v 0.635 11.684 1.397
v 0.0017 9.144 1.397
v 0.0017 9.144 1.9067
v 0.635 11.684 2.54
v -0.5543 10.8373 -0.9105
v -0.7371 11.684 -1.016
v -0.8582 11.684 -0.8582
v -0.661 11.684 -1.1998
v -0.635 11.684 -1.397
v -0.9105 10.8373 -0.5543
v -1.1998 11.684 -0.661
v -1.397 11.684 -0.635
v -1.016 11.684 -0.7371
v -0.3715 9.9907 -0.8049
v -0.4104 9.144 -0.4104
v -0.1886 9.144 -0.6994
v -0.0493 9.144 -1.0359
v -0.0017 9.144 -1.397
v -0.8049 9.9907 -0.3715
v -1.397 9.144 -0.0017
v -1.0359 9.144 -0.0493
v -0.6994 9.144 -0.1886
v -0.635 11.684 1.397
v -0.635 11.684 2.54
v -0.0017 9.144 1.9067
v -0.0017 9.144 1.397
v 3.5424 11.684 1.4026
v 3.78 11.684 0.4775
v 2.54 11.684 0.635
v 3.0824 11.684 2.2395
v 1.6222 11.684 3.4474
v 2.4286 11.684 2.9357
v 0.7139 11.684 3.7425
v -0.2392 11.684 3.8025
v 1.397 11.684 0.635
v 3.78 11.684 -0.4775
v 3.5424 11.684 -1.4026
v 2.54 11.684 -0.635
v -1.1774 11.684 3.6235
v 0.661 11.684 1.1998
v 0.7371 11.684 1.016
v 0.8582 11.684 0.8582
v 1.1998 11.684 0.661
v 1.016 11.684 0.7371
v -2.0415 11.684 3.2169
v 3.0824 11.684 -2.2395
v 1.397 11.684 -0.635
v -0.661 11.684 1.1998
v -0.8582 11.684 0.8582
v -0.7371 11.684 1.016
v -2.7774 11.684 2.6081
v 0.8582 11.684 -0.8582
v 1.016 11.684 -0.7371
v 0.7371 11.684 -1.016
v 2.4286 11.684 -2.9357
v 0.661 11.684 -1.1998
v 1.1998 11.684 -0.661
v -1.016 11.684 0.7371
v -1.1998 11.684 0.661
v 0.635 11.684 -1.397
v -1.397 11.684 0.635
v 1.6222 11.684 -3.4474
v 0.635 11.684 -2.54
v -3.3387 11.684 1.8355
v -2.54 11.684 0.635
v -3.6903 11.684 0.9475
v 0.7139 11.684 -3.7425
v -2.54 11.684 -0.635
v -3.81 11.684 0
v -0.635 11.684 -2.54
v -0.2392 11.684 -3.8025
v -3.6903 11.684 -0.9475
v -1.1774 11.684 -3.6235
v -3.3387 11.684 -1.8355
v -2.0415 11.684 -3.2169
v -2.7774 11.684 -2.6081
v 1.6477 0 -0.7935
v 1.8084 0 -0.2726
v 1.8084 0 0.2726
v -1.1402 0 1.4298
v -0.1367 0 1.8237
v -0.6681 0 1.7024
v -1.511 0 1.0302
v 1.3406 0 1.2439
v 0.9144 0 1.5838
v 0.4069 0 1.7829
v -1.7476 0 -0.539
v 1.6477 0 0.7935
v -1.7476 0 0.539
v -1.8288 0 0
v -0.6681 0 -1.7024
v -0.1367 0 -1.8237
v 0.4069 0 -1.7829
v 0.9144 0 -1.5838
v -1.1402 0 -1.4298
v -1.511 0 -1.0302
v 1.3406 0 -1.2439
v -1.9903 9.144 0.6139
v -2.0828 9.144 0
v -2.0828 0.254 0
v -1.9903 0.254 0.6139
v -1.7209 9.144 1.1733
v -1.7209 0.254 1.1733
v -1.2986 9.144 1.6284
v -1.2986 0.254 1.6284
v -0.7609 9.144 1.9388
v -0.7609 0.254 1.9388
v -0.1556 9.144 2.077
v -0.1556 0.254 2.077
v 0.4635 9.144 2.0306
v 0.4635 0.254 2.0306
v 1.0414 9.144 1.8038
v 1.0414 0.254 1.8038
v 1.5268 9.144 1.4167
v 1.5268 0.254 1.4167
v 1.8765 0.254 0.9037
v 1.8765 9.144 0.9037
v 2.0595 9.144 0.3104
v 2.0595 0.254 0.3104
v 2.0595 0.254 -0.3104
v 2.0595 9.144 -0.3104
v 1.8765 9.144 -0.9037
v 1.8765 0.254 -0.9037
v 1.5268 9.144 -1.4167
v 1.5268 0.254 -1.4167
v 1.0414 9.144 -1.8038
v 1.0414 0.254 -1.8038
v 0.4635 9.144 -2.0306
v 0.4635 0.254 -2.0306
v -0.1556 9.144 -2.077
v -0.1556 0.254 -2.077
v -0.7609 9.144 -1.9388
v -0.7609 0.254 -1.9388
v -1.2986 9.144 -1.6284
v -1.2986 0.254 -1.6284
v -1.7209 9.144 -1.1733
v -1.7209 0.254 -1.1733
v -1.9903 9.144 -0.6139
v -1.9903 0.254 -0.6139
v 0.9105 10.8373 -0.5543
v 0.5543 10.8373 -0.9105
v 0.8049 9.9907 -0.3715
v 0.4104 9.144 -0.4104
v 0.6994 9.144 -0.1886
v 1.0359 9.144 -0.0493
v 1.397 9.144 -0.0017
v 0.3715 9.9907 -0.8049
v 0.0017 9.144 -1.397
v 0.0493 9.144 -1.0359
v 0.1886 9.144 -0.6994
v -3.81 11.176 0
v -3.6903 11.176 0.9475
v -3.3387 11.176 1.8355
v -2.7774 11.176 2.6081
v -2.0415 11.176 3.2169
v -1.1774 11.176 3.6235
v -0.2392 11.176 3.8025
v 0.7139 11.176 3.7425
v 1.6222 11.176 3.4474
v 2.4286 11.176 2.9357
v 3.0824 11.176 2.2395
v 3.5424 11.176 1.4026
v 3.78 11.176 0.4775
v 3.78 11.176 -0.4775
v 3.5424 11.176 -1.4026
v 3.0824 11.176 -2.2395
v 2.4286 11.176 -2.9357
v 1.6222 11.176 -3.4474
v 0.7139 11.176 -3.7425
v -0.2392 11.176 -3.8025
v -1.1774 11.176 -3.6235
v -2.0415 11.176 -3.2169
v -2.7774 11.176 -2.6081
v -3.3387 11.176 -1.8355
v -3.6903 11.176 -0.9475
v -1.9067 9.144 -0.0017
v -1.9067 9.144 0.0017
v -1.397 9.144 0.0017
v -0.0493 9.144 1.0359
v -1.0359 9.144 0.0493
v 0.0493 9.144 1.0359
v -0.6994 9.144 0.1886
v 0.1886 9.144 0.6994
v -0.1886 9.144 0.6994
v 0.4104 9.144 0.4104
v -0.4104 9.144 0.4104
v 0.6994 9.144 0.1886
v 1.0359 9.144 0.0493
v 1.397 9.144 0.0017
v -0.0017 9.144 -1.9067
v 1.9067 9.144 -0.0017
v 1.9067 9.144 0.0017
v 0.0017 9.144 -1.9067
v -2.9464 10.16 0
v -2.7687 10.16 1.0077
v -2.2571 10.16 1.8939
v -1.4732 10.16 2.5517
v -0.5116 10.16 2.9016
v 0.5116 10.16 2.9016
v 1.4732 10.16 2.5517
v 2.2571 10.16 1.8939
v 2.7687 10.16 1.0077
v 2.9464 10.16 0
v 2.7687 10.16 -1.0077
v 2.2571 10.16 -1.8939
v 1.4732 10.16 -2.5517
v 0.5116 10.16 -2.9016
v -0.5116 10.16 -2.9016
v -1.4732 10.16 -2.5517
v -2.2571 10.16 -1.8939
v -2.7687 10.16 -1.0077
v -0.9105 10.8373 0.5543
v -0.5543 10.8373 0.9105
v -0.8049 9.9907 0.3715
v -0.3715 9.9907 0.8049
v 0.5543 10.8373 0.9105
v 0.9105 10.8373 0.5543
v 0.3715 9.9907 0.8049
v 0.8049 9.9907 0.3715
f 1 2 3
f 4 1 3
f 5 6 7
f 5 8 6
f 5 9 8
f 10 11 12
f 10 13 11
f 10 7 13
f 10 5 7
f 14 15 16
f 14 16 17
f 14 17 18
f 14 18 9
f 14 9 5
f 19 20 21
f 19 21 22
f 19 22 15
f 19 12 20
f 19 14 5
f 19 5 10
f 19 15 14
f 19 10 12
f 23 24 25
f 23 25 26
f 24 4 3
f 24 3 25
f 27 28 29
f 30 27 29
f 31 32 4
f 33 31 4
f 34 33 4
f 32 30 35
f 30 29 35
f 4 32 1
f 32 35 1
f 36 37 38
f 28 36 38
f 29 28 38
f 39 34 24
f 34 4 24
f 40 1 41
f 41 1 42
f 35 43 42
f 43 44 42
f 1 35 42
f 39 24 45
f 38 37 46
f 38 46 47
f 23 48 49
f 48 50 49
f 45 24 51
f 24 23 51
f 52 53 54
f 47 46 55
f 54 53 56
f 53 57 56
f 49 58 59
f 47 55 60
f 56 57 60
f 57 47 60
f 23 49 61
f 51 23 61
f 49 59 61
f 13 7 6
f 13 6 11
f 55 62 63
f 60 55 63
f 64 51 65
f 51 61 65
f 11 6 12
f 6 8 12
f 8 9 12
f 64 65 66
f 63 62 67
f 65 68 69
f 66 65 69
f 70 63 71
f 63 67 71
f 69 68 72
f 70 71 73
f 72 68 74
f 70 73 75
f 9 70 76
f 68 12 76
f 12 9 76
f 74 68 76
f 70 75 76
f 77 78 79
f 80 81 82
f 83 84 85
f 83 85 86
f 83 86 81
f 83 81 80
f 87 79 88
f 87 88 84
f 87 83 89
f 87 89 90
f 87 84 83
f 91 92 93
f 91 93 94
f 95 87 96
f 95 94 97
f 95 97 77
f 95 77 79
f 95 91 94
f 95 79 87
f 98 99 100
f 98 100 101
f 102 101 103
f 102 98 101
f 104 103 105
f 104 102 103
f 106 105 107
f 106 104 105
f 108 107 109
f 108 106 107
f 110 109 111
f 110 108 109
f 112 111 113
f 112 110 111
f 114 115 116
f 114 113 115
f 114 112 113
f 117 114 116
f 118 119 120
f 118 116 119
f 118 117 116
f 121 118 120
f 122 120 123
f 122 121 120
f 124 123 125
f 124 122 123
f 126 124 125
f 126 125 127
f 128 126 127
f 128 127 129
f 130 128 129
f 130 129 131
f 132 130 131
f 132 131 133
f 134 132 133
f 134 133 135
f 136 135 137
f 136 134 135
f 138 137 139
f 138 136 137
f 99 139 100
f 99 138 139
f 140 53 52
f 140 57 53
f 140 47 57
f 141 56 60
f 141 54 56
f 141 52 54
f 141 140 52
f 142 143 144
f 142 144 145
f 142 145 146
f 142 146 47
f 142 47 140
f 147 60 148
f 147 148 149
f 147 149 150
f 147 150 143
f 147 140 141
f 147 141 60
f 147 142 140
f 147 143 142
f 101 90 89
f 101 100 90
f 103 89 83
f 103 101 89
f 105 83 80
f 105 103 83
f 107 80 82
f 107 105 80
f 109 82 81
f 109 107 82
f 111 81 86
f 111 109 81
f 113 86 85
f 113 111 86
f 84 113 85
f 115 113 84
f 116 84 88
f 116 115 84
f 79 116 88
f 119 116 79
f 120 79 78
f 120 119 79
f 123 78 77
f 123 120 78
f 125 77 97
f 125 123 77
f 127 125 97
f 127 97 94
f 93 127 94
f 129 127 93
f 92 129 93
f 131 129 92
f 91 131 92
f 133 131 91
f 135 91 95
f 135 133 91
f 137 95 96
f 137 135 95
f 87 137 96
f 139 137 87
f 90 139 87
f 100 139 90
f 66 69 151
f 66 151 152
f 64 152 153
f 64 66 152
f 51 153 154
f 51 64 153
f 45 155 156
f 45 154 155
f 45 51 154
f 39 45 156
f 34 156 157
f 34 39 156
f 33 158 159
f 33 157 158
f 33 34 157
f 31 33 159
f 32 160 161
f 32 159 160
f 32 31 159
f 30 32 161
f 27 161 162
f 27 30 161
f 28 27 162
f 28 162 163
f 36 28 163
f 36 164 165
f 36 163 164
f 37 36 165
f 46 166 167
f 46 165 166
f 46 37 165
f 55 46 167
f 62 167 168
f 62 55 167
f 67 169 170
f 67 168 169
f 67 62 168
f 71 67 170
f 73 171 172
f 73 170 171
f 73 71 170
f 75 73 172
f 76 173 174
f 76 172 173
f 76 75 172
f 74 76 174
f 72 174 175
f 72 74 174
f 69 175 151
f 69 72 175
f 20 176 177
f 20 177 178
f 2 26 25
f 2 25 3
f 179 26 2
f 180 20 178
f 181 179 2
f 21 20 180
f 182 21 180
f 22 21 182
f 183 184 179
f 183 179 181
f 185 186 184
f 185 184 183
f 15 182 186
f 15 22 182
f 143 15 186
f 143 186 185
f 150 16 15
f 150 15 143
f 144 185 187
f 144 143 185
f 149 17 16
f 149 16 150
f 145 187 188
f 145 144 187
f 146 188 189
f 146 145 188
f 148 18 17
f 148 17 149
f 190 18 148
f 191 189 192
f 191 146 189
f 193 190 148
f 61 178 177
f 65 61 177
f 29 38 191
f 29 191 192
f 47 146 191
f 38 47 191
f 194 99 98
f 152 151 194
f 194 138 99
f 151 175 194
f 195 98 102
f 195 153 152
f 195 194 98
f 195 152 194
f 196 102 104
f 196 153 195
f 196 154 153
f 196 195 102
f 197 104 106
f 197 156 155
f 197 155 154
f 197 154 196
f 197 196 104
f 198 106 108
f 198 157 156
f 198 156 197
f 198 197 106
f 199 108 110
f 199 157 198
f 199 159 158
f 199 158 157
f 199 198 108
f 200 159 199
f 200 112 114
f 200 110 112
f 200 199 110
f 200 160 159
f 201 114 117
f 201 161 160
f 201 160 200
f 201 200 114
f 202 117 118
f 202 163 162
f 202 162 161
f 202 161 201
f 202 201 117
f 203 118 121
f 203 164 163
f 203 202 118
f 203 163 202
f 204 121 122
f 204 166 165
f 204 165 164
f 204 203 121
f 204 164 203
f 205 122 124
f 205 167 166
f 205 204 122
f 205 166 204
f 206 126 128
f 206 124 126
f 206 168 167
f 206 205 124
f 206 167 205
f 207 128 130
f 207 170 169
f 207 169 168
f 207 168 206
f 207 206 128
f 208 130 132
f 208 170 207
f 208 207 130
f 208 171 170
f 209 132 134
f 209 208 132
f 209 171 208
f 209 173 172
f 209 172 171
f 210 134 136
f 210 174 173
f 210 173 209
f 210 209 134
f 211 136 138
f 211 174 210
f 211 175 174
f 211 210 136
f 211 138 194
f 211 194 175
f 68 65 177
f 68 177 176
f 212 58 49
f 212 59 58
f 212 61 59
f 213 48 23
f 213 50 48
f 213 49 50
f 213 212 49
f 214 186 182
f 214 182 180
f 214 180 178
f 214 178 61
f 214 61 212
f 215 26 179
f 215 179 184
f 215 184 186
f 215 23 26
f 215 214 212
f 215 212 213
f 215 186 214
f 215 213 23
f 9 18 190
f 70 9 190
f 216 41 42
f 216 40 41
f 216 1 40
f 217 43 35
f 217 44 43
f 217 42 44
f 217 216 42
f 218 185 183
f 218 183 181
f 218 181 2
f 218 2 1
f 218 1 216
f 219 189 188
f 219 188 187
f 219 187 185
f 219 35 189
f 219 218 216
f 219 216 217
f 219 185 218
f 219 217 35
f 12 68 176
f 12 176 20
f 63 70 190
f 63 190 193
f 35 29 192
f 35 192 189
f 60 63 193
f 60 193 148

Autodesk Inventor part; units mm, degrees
ref_plane "YZ Plane" through (0, 0, 0) normal (1, 0, 0) x (0, 1, 0)
ref_plane "XZ Plane" through (0, 0, 0) normal (0, 1, 0) x (-1, 0, 0)
ref_plane "XY Plane" through (0, 0, 0) normal (0, 0, 1) x (1, 0, 0)
sketch "Sketch1" plane through (0, 0, 0) normal (0, 0, 1) x (1, 0, 0)
  line L0 (0, 0) -> (-2.0828, 0)
  line L1 (-2.0828, 0) -> (-2.0828, 9.144)
  line L2 (-2.0828, 9.144) -> (0, 9.144)
  line L3 (0, 9.144) -> (0, 0)
  line L4 (-2.0828, 9.144) -> (-3.81, 11.176)
  line L5 (-3.81, 11.176) -> (-3.81, 11.684)
  line L6 (-3.81, 11.684) -> (0, 11.684)
  line L7 (0, 11.684) -> (0, 9.144)
  dimension "d0" = 4.1656
  dimension "d1" = 9.144
  dimension "d2" = 7.62
  dimension "d3" = 0.508
  dimension "d4" = 2.54
revolve "Revolution1" add sketch "Sketch1" angle 360 about axis through (0, 9.144, 0) along (0, -1, 0)
thread "Thread1" size "8-32 UNC" class "2A" standard "ANSI Unified Screw Threads" full length
sketch "Sketch2" plane through (0, 11.684, 0) normal (0, 1, 0) x (1, 0, 0)
  circle A0 centre (0, 0) radius 3.81 projected
  line L0 (2.54, 0.635) -> (2.54, -0.635)
  line L1 (-2.54, -0.635) -> (-2.54, 0.635)
  line L2 (-0.635, 2.54) -> (0.635, 2.54)
  line L3 (0.635, -2.54) -> (-0.635, -2.54)
  line L4 (-0.635, -2.54) -> (-0.635, -1.397)
  line L5 (-0.635, 1.397) -> (-0.635, 2.54)
  line L6 (2.54, -0.635) -> (1.397, -0.635)
  line L7 (-1.397, -0.635) -> (-2.54, -0.635)
  line L8 (0.635, 2.54) -> (0.635, 1.397)
  line L9 (0.635, -1.397) -> (0.635, -2.54)
  line L10 (-2.54, 0.635) -> (-1.397, 0.635)
  line L11 (1.397, 0.635) -> (2.54, 0.635)
  line L12 (0, 2.54) -> (0, 0) construction
  line L13 (0, 0) -> (-2.54, 0) construction
  arc A1 (-0.635, -1.397) -> (-1.397, -0.635) centre (-1.397, -1.397) ccw
  arc A2 (1.397, -0.635) -> (0.635, -1.397) centre (1.397, -1.397) ccw
  arc A3 (0.635, 1.397) -> (1.397, 0.635) centre (1.397, 1.397) ccw
  arc A4 (-1.397, 0.635) -> (-0.635, 1.397) centre (-1.397, 1.397) ccw
  dimension "d8" = 1.27
  dimension "d9" = 5.08
  dimension "d10" = 0.762
extrude "Extrusion1" cut sketch "Sketch2" against normal blind 2.54 draft -14 contours L0 L6 A2 L9 L3 L4 A1 L7 L1 L10 A4 L5 L2 L8 A3 L11
chamfer "Chamfer1" distance 0.254 angle 45 1 edges at (2.0828, 0, 0)
properties material "Steel"
